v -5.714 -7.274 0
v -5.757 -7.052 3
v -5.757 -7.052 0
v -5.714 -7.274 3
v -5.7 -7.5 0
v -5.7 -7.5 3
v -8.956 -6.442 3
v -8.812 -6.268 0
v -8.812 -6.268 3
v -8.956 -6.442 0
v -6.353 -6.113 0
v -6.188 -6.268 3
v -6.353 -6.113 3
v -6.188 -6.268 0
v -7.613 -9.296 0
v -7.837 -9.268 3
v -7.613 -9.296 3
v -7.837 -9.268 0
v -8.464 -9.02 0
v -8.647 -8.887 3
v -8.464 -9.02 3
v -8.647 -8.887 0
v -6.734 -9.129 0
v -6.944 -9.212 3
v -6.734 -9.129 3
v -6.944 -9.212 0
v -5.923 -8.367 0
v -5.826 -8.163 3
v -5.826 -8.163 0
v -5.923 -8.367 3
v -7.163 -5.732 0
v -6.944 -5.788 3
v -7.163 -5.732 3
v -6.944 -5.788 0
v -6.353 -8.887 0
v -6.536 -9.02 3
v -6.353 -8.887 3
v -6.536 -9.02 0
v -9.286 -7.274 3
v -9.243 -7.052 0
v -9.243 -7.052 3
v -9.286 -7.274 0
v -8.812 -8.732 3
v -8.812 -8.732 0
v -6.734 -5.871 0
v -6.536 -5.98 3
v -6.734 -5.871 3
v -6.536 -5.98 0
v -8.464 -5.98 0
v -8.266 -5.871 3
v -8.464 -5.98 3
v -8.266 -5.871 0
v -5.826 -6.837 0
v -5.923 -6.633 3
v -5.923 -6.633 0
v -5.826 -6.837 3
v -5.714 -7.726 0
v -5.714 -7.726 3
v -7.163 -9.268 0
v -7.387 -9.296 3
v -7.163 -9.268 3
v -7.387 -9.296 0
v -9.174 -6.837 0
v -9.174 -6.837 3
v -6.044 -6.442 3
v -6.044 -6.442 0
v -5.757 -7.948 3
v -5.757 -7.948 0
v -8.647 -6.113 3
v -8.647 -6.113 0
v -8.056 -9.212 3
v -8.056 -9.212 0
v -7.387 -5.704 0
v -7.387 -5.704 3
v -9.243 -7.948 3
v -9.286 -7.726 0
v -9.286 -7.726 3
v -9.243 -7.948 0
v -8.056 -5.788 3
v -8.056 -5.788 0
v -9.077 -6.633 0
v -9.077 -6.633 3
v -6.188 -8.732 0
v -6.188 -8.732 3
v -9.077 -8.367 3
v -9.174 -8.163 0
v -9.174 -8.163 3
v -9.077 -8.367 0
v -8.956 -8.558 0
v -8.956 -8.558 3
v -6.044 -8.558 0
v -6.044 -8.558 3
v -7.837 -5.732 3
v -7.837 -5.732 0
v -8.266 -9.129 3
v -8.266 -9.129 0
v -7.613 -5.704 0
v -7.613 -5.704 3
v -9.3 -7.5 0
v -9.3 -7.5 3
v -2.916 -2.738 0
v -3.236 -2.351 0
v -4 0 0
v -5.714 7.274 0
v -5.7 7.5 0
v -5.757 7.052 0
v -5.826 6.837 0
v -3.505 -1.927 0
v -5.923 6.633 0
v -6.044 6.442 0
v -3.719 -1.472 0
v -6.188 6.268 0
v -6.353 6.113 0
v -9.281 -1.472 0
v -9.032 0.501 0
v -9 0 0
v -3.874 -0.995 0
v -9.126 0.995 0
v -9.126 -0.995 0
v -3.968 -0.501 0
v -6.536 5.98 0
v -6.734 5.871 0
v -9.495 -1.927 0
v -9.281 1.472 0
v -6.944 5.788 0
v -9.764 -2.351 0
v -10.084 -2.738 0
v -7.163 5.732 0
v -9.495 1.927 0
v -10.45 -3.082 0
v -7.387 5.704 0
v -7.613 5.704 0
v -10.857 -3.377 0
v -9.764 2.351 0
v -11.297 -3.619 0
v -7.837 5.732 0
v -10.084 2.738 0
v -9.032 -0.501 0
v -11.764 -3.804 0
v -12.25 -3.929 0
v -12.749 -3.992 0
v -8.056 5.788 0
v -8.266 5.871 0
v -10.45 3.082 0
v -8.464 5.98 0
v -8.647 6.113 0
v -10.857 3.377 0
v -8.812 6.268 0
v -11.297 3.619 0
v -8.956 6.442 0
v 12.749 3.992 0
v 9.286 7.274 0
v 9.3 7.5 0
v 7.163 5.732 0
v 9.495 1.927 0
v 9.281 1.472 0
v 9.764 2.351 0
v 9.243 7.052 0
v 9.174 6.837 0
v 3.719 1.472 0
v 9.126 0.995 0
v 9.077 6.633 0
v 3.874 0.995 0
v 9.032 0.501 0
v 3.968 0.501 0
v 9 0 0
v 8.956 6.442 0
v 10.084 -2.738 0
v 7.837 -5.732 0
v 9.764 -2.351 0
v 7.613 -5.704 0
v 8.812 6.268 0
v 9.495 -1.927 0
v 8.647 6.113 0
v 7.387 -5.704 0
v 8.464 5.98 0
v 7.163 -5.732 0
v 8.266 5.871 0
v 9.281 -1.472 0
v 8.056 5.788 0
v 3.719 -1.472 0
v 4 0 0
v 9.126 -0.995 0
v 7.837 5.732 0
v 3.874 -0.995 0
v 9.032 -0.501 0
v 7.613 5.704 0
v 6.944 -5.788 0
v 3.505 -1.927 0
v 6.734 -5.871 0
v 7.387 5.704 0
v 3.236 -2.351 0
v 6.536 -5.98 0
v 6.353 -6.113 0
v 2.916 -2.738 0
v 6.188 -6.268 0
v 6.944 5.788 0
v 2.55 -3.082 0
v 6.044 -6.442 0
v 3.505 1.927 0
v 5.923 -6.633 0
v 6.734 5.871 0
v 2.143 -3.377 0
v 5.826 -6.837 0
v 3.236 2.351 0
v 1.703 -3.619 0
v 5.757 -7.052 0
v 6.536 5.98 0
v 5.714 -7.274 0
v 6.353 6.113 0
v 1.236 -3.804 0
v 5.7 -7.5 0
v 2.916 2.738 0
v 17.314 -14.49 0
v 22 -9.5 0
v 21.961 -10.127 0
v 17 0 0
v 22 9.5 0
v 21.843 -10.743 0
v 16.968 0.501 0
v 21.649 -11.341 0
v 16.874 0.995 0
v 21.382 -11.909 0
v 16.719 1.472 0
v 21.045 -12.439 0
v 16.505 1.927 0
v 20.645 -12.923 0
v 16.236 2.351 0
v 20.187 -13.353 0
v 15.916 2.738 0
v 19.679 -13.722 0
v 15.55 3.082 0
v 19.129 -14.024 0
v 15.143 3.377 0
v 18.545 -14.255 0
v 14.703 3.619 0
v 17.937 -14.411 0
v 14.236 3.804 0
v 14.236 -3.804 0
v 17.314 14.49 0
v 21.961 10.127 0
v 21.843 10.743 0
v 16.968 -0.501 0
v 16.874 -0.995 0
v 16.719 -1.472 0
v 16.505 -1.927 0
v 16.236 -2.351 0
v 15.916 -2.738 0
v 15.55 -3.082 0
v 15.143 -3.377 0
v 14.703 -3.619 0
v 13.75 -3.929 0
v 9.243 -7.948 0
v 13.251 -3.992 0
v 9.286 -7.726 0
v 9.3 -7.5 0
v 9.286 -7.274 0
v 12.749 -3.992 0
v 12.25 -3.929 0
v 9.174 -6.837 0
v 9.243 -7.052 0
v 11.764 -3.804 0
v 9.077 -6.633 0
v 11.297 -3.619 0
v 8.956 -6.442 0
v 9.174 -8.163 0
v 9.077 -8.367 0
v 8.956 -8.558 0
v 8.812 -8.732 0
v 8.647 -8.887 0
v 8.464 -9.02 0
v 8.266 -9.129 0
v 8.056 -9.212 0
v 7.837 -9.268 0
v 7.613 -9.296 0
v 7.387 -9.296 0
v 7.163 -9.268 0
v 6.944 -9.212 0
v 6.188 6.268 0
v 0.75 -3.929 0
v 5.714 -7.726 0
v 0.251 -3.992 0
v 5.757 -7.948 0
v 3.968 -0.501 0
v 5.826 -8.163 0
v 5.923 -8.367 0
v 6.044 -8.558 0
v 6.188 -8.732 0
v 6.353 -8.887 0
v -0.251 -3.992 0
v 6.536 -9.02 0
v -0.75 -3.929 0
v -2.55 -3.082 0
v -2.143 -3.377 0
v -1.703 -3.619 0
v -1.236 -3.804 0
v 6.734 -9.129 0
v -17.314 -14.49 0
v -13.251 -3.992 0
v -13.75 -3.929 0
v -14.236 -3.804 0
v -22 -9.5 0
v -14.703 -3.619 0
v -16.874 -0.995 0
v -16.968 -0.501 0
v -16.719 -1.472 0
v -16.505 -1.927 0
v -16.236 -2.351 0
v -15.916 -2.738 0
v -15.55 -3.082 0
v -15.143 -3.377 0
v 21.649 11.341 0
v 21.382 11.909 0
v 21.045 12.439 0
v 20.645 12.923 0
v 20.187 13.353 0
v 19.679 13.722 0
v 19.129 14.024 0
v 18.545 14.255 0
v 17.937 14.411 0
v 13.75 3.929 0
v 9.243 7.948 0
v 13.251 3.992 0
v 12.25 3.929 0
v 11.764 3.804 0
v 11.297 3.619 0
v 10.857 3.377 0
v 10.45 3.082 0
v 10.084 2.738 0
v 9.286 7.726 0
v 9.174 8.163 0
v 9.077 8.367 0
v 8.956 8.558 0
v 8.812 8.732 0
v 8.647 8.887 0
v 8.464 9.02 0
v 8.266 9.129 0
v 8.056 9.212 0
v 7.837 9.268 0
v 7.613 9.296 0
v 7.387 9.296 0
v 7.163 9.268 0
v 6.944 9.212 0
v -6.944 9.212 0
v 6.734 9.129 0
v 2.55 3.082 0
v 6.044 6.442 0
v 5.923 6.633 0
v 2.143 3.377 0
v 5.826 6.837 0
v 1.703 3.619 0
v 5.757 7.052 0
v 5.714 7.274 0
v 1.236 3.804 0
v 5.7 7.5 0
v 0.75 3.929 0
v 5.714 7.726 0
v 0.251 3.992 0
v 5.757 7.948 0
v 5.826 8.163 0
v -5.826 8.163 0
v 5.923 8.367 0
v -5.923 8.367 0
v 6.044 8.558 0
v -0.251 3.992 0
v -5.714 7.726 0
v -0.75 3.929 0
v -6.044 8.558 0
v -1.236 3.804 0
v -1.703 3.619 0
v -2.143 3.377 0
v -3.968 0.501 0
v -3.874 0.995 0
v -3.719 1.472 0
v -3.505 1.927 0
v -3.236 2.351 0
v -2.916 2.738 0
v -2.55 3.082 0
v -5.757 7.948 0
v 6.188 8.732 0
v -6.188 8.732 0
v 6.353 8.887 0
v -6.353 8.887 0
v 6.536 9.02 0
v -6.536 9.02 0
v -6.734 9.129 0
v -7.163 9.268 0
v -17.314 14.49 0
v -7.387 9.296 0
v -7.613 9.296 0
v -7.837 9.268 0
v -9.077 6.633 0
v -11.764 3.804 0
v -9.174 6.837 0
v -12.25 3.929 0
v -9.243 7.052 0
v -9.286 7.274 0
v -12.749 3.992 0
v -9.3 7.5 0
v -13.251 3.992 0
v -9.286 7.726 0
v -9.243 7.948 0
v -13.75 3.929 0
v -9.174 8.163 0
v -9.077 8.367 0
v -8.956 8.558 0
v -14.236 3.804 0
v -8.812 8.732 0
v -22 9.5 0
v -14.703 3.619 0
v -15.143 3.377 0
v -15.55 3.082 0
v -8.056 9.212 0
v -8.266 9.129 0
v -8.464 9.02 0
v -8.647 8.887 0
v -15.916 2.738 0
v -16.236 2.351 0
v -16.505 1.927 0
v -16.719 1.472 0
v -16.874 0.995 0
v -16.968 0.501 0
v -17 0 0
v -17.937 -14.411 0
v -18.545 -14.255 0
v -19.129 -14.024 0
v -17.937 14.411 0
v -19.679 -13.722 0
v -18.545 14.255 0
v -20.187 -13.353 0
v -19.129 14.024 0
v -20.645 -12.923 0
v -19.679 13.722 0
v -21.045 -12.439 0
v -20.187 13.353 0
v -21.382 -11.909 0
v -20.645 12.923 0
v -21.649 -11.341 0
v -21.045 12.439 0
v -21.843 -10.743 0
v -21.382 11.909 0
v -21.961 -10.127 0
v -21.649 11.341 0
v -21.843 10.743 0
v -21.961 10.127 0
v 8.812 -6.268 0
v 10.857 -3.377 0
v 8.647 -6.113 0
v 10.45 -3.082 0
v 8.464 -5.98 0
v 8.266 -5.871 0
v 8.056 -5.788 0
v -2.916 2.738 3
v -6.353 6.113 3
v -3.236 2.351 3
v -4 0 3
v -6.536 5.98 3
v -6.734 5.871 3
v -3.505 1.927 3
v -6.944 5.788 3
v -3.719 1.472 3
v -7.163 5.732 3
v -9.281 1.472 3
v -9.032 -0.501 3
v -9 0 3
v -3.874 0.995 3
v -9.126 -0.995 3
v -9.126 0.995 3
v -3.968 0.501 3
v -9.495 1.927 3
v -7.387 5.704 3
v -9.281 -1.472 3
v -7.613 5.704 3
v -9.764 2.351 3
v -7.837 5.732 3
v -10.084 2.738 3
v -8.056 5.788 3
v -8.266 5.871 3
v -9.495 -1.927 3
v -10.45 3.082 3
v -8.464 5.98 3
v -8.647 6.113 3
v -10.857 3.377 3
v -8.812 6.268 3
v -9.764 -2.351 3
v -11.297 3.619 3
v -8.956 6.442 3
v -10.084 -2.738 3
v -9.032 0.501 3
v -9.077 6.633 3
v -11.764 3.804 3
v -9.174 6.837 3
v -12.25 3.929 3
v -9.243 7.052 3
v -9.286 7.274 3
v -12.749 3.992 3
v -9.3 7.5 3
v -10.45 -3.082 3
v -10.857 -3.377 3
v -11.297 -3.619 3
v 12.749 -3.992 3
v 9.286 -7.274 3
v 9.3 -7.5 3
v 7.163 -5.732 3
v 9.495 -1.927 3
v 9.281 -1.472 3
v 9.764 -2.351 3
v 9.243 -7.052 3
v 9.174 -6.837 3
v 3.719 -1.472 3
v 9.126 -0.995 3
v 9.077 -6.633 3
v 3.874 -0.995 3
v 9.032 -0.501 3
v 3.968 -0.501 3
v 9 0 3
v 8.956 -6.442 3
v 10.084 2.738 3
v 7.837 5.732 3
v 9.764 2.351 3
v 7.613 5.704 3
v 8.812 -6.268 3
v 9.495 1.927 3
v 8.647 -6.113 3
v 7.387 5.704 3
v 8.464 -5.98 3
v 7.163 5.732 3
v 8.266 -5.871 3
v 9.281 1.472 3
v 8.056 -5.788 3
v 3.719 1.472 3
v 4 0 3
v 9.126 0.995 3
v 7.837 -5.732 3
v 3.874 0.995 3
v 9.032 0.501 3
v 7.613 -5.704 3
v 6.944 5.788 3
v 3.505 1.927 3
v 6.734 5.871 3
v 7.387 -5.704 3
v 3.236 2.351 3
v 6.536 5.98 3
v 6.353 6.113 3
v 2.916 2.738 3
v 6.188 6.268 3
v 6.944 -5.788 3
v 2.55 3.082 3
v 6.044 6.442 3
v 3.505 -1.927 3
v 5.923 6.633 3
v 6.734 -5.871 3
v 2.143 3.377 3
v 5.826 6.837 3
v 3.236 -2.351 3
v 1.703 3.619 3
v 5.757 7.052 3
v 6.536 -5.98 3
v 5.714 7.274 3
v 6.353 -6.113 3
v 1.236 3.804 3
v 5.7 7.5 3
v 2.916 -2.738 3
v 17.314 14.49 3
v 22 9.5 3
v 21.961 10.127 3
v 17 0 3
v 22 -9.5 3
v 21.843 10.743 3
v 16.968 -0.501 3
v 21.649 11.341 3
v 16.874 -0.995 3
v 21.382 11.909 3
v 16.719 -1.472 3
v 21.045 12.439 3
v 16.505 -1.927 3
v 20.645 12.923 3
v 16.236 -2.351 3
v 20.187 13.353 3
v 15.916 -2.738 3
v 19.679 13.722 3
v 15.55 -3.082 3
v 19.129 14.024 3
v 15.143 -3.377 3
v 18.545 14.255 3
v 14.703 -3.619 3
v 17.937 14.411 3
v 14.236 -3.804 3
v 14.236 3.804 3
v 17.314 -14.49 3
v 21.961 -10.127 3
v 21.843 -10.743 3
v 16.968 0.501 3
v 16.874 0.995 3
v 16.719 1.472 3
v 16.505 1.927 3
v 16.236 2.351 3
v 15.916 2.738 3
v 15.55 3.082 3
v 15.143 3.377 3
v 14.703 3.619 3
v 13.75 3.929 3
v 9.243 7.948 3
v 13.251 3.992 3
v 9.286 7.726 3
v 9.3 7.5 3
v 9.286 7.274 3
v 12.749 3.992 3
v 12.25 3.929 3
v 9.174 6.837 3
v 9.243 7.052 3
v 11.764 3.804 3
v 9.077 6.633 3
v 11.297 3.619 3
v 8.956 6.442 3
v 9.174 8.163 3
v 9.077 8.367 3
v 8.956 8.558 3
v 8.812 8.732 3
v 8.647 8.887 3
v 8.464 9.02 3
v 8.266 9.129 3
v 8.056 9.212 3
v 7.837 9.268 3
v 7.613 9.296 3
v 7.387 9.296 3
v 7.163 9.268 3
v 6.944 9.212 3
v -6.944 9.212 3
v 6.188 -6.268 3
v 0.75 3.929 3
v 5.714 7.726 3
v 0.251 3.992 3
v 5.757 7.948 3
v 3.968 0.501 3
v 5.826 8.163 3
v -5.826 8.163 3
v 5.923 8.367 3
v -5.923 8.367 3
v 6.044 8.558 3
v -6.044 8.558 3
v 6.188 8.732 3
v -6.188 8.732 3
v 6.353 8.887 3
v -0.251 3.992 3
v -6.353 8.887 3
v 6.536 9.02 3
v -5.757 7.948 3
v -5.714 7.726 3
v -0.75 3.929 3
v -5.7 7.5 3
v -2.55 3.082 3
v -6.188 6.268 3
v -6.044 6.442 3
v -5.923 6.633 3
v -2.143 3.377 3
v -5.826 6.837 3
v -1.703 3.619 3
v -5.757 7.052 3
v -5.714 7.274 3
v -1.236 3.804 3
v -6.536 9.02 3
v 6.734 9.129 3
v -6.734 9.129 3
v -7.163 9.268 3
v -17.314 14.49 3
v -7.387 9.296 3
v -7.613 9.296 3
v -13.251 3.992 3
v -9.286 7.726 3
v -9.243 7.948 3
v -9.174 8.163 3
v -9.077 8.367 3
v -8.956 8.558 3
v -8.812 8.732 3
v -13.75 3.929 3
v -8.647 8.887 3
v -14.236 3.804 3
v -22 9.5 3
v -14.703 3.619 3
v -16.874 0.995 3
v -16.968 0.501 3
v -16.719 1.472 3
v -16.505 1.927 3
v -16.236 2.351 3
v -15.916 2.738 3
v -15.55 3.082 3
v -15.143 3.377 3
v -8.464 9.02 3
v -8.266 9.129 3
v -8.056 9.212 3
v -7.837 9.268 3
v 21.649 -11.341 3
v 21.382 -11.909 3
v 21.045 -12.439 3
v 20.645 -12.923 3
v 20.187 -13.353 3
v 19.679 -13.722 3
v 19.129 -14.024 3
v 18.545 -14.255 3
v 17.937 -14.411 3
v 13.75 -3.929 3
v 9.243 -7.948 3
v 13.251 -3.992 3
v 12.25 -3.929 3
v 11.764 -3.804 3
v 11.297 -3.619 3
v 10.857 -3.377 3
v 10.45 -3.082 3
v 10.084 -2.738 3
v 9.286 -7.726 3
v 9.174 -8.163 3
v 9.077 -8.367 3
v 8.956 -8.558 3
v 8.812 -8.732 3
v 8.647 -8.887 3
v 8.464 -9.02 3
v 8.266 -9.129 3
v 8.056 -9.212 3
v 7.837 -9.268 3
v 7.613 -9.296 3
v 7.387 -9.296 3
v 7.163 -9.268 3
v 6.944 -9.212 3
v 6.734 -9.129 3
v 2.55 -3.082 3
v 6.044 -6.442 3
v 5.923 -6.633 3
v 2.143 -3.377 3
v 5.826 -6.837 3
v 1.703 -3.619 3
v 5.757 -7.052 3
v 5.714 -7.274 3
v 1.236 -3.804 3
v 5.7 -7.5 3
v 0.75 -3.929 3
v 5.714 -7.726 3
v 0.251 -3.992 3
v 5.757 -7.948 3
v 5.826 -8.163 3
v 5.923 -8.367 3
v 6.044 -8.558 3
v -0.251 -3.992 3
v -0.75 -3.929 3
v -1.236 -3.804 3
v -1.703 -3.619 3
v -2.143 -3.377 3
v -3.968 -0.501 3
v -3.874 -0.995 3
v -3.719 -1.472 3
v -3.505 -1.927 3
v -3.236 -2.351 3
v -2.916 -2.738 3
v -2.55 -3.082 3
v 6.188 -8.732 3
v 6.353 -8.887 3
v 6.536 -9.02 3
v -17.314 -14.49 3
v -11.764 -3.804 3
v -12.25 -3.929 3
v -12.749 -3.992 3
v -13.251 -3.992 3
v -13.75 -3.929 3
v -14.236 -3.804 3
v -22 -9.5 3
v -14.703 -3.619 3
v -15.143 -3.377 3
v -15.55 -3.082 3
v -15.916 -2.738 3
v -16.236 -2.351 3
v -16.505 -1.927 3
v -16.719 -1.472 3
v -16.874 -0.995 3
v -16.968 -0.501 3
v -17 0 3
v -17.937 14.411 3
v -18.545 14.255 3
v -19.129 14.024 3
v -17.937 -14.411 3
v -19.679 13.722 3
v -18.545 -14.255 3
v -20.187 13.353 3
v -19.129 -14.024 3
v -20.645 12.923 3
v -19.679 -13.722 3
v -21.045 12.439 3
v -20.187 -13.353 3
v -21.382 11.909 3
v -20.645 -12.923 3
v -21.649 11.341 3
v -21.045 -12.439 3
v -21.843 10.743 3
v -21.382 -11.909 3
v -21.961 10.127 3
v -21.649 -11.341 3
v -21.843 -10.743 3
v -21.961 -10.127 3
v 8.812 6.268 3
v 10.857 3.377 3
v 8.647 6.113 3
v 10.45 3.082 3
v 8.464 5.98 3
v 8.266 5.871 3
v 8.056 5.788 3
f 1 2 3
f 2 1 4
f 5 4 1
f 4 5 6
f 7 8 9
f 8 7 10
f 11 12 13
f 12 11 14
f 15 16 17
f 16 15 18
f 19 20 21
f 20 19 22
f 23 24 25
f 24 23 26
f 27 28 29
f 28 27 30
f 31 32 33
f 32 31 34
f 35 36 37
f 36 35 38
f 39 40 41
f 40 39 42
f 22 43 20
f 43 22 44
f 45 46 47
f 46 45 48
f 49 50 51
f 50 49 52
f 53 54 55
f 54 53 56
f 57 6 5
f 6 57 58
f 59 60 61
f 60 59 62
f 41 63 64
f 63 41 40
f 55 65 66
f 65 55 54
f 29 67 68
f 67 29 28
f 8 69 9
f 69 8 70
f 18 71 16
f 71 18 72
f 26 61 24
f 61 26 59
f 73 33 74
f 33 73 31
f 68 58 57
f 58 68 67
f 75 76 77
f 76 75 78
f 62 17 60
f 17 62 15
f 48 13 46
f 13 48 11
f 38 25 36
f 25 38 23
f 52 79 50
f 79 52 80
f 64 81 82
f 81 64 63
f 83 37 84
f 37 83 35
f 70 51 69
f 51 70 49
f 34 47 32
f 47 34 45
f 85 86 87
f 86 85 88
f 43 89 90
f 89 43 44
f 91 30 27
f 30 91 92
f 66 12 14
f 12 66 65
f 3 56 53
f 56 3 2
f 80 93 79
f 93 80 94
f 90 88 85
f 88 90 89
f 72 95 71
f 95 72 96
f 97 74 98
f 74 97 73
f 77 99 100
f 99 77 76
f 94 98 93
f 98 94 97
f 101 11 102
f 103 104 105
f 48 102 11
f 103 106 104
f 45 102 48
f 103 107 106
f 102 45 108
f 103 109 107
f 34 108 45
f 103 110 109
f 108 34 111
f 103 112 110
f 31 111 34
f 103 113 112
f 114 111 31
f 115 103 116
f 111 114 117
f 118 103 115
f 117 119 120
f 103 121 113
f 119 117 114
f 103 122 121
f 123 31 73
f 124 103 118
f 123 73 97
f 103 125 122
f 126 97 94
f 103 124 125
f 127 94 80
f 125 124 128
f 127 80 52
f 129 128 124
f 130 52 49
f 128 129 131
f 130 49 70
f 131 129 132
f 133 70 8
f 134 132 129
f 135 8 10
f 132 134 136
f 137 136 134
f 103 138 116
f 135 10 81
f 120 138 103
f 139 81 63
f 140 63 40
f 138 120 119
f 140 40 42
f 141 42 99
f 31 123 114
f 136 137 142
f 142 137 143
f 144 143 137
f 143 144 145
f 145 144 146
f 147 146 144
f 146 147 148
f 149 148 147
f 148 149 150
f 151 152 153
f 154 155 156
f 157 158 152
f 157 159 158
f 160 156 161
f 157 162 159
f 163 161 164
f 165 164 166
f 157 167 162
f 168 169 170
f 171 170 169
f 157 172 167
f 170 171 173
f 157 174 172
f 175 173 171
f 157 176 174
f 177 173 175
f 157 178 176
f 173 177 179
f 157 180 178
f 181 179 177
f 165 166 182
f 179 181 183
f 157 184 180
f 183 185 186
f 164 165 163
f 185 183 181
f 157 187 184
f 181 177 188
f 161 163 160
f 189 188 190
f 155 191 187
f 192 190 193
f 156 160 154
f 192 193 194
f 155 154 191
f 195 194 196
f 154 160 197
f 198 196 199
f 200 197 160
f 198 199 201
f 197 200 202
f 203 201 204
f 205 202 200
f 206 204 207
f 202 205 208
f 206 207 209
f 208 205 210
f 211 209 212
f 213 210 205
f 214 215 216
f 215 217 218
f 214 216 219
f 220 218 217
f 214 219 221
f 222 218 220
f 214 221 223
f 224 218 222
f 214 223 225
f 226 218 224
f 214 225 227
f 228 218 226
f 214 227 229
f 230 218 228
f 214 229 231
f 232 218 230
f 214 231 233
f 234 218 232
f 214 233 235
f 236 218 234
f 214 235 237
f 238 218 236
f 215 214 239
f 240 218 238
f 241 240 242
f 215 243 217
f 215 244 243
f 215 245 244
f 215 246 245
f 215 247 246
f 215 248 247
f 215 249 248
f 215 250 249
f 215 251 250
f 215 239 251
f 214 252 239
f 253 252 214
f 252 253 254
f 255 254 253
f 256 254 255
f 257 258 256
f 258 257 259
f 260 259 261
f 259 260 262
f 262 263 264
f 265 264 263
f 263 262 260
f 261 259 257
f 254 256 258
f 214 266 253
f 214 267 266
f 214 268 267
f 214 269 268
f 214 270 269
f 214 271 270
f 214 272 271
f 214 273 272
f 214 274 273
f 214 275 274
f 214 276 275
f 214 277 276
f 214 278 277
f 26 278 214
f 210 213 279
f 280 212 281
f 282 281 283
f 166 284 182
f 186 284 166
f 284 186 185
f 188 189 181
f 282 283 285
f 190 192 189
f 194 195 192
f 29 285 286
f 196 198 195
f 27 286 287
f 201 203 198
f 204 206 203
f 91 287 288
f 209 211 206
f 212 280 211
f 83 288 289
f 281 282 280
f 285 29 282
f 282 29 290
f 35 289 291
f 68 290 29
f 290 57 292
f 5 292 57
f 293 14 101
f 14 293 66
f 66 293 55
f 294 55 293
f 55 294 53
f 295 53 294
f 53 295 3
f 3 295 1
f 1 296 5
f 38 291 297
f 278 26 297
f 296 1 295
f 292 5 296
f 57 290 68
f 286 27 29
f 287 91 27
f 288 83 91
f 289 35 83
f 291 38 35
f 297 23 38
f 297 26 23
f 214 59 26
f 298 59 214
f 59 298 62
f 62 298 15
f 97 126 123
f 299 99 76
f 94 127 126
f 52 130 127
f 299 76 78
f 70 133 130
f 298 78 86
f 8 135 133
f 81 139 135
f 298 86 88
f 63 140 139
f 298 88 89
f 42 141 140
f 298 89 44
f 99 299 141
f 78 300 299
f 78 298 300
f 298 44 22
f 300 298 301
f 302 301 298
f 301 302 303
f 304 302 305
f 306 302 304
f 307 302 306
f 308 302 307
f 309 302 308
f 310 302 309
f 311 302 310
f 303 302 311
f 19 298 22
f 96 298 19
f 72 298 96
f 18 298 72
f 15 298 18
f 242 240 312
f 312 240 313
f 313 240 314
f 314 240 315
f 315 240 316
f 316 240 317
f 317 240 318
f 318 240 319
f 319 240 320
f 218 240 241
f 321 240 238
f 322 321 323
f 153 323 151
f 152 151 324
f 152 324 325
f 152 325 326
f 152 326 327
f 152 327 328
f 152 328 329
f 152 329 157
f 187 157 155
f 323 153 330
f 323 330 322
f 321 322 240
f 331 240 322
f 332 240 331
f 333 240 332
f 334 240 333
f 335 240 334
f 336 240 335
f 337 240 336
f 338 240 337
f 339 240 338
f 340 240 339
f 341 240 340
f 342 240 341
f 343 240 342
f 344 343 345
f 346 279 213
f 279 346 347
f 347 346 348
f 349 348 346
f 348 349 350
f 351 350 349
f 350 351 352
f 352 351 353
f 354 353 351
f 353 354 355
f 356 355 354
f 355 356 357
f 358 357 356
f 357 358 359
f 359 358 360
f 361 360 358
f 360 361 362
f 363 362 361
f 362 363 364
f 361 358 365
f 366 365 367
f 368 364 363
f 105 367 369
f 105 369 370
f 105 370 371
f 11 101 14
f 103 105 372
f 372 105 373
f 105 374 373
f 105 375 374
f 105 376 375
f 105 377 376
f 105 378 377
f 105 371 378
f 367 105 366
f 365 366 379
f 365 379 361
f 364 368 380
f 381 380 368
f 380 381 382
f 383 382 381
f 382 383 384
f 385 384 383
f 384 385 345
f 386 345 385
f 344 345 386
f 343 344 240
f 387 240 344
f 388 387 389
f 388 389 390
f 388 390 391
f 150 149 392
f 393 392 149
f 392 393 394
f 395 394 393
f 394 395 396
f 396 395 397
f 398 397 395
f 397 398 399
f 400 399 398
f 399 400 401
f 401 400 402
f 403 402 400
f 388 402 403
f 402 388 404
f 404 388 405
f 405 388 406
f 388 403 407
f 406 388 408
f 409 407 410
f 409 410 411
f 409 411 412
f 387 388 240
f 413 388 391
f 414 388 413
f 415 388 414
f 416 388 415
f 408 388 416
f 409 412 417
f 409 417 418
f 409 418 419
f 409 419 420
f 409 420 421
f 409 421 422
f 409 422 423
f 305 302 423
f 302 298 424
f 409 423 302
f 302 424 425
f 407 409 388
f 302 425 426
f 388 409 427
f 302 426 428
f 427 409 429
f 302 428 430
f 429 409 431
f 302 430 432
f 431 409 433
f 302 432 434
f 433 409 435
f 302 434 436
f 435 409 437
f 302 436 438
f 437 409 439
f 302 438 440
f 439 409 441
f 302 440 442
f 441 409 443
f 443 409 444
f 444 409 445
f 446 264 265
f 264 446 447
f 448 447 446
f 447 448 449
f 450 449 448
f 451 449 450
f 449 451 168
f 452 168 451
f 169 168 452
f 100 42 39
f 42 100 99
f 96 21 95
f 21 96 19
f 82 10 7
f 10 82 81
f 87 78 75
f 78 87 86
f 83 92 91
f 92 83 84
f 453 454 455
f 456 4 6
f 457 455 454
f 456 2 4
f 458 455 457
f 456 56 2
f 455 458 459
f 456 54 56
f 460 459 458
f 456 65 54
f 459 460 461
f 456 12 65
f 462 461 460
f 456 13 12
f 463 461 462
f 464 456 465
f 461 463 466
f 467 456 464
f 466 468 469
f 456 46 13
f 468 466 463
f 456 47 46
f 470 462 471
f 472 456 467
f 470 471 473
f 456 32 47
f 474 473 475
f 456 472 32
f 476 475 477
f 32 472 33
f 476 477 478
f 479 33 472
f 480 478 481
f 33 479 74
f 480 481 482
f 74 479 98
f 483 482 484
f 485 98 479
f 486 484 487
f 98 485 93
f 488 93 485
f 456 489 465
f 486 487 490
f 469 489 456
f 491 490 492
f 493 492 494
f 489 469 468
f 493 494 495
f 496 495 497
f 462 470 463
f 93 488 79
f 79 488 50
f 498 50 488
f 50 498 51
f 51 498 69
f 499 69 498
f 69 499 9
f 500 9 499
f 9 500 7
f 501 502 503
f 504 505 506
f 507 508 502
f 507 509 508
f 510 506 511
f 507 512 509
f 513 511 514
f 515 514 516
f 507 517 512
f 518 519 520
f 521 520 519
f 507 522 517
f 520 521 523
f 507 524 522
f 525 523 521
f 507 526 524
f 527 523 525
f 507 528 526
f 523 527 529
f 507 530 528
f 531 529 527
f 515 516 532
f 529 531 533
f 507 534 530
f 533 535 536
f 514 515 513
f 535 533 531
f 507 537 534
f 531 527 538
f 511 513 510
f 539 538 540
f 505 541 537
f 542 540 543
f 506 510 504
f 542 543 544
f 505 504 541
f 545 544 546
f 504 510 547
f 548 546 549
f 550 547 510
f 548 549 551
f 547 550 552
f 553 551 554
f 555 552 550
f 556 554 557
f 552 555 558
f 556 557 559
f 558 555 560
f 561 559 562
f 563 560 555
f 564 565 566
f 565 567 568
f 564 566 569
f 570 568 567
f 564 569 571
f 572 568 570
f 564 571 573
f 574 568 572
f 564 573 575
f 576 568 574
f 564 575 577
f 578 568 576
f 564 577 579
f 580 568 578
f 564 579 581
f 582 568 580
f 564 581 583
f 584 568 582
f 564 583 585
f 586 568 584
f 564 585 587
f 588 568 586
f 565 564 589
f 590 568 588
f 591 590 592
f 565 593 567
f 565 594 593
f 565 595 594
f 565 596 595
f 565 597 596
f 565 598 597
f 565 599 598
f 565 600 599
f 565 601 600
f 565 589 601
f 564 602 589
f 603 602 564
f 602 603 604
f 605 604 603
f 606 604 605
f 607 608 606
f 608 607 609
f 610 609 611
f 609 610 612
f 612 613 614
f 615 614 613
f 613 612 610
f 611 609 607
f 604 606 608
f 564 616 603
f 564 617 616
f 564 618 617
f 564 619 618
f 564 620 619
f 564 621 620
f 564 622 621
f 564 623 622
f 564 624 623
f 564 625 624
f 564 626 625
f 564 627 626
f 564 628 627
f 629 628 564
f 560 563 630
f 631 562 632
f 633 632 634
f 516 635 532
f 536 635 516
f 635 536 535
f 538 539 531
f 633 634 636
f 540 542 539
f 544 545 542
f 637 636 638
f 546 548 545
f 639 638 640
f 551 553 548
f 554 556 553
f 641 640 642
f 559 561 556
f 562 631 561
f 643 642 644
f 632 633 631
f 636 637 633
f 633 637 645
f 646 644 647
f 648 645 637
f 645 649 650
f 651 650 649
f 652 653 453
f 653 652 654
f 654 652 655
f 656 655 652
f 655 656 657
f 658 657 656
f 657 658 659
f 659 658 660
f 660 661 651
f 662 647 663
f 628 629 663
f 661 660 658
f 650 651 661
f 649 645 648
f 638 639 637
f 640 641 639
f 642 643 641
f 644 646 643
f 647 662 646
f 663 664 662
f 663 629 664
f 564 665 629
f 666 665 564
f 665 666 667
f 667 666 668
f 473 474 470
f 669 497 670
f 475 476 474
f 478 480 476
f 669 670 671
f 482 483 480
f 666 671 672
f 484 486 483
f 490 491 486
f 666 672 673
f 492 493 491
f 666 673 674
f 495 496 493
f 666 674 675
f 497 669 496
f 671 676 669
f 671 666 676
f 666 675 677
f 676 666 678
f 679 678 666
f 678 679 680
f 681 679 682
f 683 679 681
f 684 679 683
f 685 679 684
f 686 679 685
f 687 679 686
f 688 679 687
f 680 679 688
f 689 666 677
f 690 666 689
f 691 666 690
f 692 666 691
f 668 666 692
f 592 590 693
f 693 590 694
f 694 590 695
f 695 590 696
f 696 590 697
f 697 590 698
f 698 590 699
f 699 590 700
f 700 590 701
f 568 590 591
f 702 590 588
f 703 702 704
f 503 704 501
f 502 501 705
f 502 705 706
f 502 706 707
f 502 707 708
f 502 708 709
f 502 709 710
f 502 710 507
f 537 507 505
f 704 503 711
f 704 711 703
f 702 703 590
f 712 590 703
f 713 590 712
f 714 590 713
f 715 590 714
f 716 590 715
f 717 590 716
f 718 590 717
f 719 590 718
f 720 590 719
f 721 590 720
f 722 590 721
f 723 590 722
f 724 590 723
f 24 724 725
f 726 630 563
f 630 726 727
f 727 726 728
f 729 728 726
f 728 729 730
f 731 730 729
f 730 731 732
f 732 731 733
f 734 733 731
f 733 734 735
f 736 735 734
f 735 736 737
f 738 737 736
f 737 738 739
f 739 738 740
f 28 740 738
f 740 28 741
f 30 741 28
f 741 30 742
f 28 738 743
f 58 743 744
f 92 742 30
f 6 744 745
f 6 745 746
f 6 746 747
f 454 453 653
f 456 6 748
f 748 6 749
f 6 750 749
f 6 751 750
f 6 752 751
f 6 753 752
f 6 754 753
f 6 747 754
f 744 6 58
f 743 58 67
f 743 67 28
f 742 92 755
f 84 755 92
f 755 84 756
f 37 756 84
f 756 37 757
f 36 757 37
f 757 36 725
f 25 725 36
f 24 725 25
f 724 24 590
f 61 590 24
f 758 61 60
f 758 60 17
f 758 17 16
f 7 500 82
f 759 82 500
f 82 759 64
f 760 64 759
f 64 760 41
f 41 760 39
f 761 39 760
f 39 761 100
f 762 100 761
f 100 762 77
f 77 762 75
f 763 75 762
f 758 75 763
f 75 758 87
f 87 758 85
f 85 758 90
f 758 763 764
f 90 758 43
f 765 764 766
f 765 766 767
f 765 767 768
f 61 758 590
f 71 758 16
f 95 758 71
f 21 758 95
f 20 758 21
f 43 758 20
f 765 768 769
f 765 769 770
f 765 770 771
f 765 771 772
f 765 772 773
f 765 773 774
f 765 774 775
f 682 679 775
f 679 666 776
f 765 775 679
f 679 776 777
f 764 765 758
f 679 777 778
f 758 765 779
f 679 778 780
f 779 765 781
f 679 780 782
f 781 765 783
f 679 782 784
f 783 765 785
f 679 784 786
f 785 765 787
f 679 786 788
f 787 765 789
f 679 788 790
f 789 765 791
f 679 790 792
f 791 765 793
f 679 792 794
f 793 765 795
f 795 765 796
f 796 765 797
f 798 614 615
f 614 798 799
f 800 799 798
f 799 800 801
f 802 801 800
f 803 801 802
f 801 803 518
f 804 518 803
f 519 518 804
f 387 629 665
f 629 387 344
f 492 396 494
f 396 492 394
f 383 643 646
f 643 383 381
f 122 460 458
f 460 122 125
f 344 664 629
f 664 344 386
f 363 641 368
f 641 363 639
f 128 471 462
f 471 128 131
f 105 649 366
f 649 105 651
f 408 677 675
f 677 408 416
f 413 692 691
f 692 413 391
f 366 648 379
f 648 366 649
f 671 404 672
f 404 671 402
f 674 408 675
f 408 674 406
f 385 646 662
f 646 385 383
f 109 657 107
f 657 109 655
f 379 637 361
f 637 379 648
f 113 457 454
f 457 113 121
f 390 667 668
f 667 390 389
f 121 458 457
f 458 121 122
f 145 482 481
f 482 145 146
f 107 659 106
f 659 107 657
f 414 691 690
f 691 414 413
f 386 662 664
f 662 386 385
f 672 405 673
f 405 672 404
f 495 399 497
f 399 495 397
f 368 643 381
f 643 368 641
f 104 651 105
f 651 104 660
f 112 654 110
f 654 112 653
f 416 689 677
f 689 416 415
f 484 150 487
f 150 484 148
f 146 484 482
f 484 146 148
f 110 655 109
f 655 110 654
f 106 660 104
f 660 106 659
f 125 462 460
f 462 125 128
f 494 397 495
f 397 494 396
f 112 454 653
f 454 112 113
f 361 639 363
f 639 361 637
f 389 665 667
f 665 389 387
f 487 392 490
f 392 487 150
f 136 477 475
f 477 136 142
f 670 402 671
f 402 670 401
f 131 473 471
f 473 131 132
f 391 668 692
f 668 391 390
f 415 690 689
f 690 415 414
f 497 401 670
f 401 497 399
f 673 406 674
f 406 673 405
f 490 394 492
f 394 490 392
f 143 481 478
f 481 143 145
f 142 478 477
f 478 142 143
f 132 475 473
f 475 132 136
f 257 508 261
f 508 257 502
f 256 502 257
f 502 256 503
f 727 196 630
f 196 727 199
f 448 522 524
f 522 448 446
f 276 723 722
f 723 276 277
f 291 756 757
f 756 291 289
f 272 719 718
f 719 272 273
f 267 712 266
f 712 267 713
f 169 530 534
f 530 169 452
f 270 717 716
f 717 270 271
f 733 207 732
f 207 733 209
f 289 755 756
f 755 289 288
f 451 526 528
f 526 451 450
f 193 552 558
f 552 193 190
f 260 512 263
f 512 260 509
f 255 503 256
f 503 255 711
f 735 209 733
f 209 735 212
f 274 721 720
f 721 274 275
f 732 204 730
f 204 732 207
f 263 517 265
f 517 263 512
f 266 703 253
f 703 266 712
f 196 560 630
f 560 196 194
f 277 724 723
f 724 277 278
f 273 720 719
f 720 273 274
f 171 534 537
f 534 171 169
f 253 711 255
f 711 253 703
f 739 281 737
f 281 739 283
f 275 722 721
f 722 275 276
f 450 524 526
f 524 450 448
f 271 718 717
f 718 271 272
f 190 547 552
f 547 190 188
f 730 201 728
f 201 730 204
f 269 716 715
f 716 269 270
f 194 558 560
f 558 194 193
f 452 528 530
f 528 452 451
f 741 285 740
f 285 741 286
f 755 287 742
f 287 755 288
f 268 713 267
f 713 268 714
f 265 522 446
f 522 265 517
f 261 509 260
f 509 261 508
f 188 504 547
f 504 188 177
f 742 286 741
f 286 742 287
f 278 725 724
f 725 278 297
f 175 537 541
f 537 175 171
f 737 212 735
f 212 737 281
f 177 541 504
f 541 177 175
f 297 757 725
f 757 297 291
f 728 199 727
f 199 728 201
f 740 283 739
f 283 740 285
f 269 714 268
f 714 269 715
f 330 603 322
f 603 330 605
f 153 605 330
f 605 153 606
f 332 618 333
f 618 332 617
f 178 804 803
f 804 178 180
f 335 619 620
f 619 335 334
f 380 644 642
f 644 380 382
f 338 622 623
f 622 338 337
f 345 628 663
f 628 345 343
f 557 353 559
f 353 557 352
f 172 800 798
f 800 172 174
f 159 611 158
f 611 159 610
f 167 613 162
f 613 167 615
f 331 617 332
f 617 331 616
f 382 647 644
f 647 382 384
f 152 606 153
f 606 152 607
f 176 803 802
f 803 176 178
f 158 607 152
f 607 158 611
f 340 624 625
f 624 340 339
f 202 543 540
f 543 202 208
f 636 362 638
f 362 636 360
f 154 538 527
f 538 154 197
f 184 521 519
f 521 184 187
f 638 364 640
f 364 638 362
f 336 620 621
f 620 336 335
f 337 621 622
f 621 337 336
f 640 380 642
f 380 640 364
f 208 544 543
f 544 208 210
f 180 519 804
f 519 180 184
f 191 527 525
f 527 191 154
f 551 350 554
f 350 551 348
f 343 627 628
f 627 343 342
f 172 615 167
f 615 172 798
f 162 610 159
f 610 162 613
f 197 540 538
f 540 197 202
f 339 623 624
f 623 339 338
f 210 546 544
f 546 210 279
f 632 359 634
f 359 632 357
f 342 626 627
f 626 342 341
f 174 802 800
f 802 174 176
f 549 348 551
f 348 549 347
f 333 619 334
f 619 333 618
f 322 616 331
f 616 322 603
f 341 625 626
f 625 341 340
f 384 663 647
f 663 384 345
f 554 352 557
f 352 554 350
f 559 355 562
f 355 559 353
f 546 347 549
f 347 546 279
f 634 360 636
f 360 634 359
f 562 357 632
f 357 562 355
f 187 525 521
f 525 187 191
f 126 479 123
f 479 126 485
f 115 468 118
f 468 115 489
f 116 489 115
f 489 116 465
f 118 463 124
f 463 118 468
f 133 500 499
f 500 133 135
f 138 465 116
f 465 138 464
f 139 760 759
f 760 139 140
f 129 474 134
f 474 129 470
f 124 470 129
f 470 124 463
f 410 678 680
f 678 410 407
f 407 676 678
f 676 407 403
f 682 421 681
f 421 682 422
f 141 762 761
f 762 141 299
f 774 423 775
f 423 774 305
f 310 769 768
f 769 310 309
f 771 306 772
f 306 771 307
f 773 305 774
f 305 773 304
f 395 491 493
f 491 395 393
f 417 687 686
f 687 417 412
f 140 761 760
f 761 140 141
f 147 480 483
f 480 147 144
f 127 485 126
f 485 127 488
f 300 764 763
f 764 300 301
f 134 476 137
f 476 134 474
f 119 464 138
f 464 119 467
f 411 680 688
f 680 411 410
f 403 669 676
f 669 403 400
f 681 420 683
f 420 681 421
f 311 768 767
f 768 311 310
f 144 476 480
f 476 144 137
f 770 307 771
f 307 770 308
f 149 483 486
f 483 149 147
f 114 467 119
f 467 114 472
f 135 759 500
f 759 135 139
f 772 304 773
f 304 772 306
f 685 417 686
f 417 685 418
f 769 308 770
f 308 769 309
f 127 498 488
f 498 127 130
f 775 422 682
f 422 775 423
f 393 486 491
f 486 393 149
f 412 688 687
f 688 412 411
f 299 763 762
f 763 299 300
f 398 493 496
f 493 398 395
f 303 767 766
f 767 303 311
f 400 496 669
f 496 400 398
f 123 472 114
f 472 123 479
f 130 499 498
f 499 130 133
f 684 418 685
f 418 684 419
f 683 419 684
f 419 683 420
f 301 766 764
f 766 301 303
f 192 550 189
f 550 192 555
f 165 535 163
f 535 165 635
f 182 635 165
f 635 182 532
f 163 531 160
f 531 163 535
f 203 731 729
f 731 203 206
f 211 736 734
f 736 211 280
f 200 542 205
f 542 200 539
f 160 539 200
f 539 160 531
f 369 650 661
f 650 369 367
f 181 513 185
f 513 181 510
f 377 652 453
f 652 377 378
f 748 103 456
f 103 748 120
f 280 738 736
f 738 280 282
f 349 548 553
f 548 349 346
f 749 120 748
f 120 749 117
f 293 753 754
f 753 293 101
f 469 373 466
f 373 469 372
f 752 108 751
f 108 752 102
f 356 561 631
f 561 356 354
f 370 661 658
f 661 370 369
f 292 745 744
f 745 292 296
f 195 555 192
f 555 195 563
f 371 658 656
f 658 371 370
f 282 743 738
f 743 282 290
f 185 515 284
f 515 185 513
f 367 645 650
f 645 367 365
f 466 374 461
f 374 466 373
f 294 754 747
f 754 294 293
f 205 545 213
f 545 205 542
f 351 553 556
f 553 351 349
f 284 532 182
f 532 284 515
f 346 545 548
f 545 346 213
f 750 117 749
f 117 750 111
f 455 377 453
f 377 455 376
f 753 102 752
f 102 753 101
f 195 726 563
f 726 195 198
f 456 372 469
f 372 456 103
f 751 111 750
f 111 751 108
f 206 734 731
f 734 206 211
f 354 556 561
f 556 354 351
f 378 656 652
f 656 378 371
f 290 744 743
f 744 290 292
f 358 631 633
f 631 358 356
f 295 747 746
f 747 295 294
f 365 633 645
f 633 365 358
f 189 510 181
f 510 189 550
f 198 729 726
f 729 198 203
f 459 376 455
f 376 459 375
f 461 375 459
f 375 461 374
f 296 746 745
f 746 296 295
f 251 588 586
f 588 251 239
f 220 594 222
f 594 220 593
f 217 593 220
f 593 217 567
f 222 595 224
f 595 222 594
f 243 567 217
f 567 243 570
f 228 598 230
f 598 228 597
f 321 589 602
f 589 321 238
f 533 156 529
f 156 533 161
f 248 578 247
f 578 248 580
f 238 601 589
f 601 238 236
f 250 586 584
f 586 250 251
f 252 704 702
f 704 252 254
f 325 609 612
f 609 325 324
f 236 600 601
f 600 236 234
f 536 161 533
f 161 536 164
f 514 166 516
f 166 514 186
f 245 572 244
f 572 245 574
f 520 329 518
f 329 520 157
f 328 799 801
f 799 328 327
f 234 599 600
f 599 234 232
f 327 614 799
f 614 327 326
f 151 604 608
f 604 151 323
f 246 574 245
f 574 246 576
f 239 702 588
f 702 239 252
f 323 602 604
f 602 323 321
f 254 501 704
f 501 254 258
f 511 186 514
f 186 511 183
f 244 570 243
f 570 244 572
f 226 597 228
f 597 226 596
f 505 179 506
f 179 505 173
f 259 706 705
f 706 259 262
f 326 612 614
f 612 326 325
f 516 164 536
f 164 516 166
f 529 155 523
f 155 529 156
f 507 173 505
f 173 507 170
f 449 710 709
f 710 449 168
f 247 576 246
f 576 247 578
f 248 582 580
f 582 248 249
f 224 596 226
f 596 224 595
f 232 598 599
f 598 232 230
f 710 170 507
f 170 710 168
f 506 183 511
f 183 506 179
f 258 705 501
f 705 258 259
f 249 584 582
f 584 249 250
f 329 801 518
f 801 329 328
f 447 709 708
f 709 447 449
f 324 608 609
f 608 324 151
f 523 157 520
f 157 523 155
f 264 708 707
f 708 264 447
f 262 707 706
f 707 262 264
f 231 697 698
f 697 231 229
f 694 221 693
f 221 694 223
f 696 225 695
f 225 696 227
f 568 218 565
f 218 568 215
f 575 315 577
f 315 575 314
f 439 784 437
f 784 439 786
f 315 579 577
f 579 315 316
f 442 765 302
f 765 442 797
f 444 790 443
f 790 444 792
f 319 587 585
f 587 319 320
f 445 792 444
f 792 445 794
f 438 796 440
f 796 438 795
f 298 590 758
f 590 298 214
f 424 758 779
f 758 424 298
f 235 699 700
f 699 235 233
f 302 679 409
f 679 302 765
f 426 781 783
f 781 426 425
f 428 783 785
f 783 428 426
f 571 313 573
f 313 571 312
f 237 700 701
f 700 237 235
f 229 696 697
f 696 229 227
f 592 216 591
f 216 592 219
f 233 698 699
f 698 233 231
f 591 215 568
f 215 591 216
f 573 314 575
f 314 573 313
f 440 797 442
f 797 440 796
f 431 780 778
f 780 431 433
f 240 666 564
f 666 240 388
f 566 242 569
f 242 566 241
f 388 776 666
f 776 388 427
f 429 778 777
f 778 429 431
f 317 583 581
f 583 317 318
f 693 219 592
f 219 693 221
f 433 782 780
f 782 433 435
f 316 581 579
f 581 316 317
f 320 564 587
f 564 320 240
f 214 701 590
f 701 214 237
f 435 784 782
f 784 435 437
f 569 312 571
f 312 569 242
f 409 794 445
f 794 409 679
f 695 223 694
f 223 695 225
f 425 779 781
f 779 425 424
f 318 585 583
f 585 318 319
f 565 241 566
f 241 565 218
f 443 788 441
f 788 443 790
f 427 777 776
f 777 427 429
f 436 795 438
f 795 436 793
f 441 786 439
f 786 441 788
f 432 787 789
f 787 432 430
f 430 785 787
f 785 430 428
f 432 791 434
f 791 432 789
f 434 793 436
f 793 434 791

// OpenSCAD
$fn = 50;

difference() {
	union() {
		hull() {
			translate(v = [-17.0, 9.5, 0]) {
				cylinder(h = 3, r = 5);
			}
			translate(v = [17.0, 9.5, 0]) {
				cylinder(h = 3, r = 5);
			}
			translate(v = [-17.0, -9.5, 0]) {
				cylinder(h = 3, r = 5);
			}
			translate(v = [17.0, -9.5, 0]) {
				cylinder(h = 3, r = 5);
			}
		}
	}
	union() {
		translate(v = [-7.5, -7.5, 0]) {
			cylinder(h = 3, r = 1.8);
		}
		translate(v = [-7.5, 7.5, 0]) {
			cylinder(h = 3, r = 1.8);
		}
		translate(v = [7.5, -7.5, 0]) {
			cylinder(h = 3, r = 1.8);
		}
		translate(v = [7.5, 7.5, 0]) {
			cylinder(h = 3, r = 1.8);
		}
		translate(v = [-13.0, 0, 0.0]) {
			cylinder(h = 3, r = 4.0);
		}
		cylinder(h = 3, r = 4.0);
		translate(v = [13.0, 0, 0.0]) {
			cylinder(h = 3, r = 4.0);
		}
	}
}
